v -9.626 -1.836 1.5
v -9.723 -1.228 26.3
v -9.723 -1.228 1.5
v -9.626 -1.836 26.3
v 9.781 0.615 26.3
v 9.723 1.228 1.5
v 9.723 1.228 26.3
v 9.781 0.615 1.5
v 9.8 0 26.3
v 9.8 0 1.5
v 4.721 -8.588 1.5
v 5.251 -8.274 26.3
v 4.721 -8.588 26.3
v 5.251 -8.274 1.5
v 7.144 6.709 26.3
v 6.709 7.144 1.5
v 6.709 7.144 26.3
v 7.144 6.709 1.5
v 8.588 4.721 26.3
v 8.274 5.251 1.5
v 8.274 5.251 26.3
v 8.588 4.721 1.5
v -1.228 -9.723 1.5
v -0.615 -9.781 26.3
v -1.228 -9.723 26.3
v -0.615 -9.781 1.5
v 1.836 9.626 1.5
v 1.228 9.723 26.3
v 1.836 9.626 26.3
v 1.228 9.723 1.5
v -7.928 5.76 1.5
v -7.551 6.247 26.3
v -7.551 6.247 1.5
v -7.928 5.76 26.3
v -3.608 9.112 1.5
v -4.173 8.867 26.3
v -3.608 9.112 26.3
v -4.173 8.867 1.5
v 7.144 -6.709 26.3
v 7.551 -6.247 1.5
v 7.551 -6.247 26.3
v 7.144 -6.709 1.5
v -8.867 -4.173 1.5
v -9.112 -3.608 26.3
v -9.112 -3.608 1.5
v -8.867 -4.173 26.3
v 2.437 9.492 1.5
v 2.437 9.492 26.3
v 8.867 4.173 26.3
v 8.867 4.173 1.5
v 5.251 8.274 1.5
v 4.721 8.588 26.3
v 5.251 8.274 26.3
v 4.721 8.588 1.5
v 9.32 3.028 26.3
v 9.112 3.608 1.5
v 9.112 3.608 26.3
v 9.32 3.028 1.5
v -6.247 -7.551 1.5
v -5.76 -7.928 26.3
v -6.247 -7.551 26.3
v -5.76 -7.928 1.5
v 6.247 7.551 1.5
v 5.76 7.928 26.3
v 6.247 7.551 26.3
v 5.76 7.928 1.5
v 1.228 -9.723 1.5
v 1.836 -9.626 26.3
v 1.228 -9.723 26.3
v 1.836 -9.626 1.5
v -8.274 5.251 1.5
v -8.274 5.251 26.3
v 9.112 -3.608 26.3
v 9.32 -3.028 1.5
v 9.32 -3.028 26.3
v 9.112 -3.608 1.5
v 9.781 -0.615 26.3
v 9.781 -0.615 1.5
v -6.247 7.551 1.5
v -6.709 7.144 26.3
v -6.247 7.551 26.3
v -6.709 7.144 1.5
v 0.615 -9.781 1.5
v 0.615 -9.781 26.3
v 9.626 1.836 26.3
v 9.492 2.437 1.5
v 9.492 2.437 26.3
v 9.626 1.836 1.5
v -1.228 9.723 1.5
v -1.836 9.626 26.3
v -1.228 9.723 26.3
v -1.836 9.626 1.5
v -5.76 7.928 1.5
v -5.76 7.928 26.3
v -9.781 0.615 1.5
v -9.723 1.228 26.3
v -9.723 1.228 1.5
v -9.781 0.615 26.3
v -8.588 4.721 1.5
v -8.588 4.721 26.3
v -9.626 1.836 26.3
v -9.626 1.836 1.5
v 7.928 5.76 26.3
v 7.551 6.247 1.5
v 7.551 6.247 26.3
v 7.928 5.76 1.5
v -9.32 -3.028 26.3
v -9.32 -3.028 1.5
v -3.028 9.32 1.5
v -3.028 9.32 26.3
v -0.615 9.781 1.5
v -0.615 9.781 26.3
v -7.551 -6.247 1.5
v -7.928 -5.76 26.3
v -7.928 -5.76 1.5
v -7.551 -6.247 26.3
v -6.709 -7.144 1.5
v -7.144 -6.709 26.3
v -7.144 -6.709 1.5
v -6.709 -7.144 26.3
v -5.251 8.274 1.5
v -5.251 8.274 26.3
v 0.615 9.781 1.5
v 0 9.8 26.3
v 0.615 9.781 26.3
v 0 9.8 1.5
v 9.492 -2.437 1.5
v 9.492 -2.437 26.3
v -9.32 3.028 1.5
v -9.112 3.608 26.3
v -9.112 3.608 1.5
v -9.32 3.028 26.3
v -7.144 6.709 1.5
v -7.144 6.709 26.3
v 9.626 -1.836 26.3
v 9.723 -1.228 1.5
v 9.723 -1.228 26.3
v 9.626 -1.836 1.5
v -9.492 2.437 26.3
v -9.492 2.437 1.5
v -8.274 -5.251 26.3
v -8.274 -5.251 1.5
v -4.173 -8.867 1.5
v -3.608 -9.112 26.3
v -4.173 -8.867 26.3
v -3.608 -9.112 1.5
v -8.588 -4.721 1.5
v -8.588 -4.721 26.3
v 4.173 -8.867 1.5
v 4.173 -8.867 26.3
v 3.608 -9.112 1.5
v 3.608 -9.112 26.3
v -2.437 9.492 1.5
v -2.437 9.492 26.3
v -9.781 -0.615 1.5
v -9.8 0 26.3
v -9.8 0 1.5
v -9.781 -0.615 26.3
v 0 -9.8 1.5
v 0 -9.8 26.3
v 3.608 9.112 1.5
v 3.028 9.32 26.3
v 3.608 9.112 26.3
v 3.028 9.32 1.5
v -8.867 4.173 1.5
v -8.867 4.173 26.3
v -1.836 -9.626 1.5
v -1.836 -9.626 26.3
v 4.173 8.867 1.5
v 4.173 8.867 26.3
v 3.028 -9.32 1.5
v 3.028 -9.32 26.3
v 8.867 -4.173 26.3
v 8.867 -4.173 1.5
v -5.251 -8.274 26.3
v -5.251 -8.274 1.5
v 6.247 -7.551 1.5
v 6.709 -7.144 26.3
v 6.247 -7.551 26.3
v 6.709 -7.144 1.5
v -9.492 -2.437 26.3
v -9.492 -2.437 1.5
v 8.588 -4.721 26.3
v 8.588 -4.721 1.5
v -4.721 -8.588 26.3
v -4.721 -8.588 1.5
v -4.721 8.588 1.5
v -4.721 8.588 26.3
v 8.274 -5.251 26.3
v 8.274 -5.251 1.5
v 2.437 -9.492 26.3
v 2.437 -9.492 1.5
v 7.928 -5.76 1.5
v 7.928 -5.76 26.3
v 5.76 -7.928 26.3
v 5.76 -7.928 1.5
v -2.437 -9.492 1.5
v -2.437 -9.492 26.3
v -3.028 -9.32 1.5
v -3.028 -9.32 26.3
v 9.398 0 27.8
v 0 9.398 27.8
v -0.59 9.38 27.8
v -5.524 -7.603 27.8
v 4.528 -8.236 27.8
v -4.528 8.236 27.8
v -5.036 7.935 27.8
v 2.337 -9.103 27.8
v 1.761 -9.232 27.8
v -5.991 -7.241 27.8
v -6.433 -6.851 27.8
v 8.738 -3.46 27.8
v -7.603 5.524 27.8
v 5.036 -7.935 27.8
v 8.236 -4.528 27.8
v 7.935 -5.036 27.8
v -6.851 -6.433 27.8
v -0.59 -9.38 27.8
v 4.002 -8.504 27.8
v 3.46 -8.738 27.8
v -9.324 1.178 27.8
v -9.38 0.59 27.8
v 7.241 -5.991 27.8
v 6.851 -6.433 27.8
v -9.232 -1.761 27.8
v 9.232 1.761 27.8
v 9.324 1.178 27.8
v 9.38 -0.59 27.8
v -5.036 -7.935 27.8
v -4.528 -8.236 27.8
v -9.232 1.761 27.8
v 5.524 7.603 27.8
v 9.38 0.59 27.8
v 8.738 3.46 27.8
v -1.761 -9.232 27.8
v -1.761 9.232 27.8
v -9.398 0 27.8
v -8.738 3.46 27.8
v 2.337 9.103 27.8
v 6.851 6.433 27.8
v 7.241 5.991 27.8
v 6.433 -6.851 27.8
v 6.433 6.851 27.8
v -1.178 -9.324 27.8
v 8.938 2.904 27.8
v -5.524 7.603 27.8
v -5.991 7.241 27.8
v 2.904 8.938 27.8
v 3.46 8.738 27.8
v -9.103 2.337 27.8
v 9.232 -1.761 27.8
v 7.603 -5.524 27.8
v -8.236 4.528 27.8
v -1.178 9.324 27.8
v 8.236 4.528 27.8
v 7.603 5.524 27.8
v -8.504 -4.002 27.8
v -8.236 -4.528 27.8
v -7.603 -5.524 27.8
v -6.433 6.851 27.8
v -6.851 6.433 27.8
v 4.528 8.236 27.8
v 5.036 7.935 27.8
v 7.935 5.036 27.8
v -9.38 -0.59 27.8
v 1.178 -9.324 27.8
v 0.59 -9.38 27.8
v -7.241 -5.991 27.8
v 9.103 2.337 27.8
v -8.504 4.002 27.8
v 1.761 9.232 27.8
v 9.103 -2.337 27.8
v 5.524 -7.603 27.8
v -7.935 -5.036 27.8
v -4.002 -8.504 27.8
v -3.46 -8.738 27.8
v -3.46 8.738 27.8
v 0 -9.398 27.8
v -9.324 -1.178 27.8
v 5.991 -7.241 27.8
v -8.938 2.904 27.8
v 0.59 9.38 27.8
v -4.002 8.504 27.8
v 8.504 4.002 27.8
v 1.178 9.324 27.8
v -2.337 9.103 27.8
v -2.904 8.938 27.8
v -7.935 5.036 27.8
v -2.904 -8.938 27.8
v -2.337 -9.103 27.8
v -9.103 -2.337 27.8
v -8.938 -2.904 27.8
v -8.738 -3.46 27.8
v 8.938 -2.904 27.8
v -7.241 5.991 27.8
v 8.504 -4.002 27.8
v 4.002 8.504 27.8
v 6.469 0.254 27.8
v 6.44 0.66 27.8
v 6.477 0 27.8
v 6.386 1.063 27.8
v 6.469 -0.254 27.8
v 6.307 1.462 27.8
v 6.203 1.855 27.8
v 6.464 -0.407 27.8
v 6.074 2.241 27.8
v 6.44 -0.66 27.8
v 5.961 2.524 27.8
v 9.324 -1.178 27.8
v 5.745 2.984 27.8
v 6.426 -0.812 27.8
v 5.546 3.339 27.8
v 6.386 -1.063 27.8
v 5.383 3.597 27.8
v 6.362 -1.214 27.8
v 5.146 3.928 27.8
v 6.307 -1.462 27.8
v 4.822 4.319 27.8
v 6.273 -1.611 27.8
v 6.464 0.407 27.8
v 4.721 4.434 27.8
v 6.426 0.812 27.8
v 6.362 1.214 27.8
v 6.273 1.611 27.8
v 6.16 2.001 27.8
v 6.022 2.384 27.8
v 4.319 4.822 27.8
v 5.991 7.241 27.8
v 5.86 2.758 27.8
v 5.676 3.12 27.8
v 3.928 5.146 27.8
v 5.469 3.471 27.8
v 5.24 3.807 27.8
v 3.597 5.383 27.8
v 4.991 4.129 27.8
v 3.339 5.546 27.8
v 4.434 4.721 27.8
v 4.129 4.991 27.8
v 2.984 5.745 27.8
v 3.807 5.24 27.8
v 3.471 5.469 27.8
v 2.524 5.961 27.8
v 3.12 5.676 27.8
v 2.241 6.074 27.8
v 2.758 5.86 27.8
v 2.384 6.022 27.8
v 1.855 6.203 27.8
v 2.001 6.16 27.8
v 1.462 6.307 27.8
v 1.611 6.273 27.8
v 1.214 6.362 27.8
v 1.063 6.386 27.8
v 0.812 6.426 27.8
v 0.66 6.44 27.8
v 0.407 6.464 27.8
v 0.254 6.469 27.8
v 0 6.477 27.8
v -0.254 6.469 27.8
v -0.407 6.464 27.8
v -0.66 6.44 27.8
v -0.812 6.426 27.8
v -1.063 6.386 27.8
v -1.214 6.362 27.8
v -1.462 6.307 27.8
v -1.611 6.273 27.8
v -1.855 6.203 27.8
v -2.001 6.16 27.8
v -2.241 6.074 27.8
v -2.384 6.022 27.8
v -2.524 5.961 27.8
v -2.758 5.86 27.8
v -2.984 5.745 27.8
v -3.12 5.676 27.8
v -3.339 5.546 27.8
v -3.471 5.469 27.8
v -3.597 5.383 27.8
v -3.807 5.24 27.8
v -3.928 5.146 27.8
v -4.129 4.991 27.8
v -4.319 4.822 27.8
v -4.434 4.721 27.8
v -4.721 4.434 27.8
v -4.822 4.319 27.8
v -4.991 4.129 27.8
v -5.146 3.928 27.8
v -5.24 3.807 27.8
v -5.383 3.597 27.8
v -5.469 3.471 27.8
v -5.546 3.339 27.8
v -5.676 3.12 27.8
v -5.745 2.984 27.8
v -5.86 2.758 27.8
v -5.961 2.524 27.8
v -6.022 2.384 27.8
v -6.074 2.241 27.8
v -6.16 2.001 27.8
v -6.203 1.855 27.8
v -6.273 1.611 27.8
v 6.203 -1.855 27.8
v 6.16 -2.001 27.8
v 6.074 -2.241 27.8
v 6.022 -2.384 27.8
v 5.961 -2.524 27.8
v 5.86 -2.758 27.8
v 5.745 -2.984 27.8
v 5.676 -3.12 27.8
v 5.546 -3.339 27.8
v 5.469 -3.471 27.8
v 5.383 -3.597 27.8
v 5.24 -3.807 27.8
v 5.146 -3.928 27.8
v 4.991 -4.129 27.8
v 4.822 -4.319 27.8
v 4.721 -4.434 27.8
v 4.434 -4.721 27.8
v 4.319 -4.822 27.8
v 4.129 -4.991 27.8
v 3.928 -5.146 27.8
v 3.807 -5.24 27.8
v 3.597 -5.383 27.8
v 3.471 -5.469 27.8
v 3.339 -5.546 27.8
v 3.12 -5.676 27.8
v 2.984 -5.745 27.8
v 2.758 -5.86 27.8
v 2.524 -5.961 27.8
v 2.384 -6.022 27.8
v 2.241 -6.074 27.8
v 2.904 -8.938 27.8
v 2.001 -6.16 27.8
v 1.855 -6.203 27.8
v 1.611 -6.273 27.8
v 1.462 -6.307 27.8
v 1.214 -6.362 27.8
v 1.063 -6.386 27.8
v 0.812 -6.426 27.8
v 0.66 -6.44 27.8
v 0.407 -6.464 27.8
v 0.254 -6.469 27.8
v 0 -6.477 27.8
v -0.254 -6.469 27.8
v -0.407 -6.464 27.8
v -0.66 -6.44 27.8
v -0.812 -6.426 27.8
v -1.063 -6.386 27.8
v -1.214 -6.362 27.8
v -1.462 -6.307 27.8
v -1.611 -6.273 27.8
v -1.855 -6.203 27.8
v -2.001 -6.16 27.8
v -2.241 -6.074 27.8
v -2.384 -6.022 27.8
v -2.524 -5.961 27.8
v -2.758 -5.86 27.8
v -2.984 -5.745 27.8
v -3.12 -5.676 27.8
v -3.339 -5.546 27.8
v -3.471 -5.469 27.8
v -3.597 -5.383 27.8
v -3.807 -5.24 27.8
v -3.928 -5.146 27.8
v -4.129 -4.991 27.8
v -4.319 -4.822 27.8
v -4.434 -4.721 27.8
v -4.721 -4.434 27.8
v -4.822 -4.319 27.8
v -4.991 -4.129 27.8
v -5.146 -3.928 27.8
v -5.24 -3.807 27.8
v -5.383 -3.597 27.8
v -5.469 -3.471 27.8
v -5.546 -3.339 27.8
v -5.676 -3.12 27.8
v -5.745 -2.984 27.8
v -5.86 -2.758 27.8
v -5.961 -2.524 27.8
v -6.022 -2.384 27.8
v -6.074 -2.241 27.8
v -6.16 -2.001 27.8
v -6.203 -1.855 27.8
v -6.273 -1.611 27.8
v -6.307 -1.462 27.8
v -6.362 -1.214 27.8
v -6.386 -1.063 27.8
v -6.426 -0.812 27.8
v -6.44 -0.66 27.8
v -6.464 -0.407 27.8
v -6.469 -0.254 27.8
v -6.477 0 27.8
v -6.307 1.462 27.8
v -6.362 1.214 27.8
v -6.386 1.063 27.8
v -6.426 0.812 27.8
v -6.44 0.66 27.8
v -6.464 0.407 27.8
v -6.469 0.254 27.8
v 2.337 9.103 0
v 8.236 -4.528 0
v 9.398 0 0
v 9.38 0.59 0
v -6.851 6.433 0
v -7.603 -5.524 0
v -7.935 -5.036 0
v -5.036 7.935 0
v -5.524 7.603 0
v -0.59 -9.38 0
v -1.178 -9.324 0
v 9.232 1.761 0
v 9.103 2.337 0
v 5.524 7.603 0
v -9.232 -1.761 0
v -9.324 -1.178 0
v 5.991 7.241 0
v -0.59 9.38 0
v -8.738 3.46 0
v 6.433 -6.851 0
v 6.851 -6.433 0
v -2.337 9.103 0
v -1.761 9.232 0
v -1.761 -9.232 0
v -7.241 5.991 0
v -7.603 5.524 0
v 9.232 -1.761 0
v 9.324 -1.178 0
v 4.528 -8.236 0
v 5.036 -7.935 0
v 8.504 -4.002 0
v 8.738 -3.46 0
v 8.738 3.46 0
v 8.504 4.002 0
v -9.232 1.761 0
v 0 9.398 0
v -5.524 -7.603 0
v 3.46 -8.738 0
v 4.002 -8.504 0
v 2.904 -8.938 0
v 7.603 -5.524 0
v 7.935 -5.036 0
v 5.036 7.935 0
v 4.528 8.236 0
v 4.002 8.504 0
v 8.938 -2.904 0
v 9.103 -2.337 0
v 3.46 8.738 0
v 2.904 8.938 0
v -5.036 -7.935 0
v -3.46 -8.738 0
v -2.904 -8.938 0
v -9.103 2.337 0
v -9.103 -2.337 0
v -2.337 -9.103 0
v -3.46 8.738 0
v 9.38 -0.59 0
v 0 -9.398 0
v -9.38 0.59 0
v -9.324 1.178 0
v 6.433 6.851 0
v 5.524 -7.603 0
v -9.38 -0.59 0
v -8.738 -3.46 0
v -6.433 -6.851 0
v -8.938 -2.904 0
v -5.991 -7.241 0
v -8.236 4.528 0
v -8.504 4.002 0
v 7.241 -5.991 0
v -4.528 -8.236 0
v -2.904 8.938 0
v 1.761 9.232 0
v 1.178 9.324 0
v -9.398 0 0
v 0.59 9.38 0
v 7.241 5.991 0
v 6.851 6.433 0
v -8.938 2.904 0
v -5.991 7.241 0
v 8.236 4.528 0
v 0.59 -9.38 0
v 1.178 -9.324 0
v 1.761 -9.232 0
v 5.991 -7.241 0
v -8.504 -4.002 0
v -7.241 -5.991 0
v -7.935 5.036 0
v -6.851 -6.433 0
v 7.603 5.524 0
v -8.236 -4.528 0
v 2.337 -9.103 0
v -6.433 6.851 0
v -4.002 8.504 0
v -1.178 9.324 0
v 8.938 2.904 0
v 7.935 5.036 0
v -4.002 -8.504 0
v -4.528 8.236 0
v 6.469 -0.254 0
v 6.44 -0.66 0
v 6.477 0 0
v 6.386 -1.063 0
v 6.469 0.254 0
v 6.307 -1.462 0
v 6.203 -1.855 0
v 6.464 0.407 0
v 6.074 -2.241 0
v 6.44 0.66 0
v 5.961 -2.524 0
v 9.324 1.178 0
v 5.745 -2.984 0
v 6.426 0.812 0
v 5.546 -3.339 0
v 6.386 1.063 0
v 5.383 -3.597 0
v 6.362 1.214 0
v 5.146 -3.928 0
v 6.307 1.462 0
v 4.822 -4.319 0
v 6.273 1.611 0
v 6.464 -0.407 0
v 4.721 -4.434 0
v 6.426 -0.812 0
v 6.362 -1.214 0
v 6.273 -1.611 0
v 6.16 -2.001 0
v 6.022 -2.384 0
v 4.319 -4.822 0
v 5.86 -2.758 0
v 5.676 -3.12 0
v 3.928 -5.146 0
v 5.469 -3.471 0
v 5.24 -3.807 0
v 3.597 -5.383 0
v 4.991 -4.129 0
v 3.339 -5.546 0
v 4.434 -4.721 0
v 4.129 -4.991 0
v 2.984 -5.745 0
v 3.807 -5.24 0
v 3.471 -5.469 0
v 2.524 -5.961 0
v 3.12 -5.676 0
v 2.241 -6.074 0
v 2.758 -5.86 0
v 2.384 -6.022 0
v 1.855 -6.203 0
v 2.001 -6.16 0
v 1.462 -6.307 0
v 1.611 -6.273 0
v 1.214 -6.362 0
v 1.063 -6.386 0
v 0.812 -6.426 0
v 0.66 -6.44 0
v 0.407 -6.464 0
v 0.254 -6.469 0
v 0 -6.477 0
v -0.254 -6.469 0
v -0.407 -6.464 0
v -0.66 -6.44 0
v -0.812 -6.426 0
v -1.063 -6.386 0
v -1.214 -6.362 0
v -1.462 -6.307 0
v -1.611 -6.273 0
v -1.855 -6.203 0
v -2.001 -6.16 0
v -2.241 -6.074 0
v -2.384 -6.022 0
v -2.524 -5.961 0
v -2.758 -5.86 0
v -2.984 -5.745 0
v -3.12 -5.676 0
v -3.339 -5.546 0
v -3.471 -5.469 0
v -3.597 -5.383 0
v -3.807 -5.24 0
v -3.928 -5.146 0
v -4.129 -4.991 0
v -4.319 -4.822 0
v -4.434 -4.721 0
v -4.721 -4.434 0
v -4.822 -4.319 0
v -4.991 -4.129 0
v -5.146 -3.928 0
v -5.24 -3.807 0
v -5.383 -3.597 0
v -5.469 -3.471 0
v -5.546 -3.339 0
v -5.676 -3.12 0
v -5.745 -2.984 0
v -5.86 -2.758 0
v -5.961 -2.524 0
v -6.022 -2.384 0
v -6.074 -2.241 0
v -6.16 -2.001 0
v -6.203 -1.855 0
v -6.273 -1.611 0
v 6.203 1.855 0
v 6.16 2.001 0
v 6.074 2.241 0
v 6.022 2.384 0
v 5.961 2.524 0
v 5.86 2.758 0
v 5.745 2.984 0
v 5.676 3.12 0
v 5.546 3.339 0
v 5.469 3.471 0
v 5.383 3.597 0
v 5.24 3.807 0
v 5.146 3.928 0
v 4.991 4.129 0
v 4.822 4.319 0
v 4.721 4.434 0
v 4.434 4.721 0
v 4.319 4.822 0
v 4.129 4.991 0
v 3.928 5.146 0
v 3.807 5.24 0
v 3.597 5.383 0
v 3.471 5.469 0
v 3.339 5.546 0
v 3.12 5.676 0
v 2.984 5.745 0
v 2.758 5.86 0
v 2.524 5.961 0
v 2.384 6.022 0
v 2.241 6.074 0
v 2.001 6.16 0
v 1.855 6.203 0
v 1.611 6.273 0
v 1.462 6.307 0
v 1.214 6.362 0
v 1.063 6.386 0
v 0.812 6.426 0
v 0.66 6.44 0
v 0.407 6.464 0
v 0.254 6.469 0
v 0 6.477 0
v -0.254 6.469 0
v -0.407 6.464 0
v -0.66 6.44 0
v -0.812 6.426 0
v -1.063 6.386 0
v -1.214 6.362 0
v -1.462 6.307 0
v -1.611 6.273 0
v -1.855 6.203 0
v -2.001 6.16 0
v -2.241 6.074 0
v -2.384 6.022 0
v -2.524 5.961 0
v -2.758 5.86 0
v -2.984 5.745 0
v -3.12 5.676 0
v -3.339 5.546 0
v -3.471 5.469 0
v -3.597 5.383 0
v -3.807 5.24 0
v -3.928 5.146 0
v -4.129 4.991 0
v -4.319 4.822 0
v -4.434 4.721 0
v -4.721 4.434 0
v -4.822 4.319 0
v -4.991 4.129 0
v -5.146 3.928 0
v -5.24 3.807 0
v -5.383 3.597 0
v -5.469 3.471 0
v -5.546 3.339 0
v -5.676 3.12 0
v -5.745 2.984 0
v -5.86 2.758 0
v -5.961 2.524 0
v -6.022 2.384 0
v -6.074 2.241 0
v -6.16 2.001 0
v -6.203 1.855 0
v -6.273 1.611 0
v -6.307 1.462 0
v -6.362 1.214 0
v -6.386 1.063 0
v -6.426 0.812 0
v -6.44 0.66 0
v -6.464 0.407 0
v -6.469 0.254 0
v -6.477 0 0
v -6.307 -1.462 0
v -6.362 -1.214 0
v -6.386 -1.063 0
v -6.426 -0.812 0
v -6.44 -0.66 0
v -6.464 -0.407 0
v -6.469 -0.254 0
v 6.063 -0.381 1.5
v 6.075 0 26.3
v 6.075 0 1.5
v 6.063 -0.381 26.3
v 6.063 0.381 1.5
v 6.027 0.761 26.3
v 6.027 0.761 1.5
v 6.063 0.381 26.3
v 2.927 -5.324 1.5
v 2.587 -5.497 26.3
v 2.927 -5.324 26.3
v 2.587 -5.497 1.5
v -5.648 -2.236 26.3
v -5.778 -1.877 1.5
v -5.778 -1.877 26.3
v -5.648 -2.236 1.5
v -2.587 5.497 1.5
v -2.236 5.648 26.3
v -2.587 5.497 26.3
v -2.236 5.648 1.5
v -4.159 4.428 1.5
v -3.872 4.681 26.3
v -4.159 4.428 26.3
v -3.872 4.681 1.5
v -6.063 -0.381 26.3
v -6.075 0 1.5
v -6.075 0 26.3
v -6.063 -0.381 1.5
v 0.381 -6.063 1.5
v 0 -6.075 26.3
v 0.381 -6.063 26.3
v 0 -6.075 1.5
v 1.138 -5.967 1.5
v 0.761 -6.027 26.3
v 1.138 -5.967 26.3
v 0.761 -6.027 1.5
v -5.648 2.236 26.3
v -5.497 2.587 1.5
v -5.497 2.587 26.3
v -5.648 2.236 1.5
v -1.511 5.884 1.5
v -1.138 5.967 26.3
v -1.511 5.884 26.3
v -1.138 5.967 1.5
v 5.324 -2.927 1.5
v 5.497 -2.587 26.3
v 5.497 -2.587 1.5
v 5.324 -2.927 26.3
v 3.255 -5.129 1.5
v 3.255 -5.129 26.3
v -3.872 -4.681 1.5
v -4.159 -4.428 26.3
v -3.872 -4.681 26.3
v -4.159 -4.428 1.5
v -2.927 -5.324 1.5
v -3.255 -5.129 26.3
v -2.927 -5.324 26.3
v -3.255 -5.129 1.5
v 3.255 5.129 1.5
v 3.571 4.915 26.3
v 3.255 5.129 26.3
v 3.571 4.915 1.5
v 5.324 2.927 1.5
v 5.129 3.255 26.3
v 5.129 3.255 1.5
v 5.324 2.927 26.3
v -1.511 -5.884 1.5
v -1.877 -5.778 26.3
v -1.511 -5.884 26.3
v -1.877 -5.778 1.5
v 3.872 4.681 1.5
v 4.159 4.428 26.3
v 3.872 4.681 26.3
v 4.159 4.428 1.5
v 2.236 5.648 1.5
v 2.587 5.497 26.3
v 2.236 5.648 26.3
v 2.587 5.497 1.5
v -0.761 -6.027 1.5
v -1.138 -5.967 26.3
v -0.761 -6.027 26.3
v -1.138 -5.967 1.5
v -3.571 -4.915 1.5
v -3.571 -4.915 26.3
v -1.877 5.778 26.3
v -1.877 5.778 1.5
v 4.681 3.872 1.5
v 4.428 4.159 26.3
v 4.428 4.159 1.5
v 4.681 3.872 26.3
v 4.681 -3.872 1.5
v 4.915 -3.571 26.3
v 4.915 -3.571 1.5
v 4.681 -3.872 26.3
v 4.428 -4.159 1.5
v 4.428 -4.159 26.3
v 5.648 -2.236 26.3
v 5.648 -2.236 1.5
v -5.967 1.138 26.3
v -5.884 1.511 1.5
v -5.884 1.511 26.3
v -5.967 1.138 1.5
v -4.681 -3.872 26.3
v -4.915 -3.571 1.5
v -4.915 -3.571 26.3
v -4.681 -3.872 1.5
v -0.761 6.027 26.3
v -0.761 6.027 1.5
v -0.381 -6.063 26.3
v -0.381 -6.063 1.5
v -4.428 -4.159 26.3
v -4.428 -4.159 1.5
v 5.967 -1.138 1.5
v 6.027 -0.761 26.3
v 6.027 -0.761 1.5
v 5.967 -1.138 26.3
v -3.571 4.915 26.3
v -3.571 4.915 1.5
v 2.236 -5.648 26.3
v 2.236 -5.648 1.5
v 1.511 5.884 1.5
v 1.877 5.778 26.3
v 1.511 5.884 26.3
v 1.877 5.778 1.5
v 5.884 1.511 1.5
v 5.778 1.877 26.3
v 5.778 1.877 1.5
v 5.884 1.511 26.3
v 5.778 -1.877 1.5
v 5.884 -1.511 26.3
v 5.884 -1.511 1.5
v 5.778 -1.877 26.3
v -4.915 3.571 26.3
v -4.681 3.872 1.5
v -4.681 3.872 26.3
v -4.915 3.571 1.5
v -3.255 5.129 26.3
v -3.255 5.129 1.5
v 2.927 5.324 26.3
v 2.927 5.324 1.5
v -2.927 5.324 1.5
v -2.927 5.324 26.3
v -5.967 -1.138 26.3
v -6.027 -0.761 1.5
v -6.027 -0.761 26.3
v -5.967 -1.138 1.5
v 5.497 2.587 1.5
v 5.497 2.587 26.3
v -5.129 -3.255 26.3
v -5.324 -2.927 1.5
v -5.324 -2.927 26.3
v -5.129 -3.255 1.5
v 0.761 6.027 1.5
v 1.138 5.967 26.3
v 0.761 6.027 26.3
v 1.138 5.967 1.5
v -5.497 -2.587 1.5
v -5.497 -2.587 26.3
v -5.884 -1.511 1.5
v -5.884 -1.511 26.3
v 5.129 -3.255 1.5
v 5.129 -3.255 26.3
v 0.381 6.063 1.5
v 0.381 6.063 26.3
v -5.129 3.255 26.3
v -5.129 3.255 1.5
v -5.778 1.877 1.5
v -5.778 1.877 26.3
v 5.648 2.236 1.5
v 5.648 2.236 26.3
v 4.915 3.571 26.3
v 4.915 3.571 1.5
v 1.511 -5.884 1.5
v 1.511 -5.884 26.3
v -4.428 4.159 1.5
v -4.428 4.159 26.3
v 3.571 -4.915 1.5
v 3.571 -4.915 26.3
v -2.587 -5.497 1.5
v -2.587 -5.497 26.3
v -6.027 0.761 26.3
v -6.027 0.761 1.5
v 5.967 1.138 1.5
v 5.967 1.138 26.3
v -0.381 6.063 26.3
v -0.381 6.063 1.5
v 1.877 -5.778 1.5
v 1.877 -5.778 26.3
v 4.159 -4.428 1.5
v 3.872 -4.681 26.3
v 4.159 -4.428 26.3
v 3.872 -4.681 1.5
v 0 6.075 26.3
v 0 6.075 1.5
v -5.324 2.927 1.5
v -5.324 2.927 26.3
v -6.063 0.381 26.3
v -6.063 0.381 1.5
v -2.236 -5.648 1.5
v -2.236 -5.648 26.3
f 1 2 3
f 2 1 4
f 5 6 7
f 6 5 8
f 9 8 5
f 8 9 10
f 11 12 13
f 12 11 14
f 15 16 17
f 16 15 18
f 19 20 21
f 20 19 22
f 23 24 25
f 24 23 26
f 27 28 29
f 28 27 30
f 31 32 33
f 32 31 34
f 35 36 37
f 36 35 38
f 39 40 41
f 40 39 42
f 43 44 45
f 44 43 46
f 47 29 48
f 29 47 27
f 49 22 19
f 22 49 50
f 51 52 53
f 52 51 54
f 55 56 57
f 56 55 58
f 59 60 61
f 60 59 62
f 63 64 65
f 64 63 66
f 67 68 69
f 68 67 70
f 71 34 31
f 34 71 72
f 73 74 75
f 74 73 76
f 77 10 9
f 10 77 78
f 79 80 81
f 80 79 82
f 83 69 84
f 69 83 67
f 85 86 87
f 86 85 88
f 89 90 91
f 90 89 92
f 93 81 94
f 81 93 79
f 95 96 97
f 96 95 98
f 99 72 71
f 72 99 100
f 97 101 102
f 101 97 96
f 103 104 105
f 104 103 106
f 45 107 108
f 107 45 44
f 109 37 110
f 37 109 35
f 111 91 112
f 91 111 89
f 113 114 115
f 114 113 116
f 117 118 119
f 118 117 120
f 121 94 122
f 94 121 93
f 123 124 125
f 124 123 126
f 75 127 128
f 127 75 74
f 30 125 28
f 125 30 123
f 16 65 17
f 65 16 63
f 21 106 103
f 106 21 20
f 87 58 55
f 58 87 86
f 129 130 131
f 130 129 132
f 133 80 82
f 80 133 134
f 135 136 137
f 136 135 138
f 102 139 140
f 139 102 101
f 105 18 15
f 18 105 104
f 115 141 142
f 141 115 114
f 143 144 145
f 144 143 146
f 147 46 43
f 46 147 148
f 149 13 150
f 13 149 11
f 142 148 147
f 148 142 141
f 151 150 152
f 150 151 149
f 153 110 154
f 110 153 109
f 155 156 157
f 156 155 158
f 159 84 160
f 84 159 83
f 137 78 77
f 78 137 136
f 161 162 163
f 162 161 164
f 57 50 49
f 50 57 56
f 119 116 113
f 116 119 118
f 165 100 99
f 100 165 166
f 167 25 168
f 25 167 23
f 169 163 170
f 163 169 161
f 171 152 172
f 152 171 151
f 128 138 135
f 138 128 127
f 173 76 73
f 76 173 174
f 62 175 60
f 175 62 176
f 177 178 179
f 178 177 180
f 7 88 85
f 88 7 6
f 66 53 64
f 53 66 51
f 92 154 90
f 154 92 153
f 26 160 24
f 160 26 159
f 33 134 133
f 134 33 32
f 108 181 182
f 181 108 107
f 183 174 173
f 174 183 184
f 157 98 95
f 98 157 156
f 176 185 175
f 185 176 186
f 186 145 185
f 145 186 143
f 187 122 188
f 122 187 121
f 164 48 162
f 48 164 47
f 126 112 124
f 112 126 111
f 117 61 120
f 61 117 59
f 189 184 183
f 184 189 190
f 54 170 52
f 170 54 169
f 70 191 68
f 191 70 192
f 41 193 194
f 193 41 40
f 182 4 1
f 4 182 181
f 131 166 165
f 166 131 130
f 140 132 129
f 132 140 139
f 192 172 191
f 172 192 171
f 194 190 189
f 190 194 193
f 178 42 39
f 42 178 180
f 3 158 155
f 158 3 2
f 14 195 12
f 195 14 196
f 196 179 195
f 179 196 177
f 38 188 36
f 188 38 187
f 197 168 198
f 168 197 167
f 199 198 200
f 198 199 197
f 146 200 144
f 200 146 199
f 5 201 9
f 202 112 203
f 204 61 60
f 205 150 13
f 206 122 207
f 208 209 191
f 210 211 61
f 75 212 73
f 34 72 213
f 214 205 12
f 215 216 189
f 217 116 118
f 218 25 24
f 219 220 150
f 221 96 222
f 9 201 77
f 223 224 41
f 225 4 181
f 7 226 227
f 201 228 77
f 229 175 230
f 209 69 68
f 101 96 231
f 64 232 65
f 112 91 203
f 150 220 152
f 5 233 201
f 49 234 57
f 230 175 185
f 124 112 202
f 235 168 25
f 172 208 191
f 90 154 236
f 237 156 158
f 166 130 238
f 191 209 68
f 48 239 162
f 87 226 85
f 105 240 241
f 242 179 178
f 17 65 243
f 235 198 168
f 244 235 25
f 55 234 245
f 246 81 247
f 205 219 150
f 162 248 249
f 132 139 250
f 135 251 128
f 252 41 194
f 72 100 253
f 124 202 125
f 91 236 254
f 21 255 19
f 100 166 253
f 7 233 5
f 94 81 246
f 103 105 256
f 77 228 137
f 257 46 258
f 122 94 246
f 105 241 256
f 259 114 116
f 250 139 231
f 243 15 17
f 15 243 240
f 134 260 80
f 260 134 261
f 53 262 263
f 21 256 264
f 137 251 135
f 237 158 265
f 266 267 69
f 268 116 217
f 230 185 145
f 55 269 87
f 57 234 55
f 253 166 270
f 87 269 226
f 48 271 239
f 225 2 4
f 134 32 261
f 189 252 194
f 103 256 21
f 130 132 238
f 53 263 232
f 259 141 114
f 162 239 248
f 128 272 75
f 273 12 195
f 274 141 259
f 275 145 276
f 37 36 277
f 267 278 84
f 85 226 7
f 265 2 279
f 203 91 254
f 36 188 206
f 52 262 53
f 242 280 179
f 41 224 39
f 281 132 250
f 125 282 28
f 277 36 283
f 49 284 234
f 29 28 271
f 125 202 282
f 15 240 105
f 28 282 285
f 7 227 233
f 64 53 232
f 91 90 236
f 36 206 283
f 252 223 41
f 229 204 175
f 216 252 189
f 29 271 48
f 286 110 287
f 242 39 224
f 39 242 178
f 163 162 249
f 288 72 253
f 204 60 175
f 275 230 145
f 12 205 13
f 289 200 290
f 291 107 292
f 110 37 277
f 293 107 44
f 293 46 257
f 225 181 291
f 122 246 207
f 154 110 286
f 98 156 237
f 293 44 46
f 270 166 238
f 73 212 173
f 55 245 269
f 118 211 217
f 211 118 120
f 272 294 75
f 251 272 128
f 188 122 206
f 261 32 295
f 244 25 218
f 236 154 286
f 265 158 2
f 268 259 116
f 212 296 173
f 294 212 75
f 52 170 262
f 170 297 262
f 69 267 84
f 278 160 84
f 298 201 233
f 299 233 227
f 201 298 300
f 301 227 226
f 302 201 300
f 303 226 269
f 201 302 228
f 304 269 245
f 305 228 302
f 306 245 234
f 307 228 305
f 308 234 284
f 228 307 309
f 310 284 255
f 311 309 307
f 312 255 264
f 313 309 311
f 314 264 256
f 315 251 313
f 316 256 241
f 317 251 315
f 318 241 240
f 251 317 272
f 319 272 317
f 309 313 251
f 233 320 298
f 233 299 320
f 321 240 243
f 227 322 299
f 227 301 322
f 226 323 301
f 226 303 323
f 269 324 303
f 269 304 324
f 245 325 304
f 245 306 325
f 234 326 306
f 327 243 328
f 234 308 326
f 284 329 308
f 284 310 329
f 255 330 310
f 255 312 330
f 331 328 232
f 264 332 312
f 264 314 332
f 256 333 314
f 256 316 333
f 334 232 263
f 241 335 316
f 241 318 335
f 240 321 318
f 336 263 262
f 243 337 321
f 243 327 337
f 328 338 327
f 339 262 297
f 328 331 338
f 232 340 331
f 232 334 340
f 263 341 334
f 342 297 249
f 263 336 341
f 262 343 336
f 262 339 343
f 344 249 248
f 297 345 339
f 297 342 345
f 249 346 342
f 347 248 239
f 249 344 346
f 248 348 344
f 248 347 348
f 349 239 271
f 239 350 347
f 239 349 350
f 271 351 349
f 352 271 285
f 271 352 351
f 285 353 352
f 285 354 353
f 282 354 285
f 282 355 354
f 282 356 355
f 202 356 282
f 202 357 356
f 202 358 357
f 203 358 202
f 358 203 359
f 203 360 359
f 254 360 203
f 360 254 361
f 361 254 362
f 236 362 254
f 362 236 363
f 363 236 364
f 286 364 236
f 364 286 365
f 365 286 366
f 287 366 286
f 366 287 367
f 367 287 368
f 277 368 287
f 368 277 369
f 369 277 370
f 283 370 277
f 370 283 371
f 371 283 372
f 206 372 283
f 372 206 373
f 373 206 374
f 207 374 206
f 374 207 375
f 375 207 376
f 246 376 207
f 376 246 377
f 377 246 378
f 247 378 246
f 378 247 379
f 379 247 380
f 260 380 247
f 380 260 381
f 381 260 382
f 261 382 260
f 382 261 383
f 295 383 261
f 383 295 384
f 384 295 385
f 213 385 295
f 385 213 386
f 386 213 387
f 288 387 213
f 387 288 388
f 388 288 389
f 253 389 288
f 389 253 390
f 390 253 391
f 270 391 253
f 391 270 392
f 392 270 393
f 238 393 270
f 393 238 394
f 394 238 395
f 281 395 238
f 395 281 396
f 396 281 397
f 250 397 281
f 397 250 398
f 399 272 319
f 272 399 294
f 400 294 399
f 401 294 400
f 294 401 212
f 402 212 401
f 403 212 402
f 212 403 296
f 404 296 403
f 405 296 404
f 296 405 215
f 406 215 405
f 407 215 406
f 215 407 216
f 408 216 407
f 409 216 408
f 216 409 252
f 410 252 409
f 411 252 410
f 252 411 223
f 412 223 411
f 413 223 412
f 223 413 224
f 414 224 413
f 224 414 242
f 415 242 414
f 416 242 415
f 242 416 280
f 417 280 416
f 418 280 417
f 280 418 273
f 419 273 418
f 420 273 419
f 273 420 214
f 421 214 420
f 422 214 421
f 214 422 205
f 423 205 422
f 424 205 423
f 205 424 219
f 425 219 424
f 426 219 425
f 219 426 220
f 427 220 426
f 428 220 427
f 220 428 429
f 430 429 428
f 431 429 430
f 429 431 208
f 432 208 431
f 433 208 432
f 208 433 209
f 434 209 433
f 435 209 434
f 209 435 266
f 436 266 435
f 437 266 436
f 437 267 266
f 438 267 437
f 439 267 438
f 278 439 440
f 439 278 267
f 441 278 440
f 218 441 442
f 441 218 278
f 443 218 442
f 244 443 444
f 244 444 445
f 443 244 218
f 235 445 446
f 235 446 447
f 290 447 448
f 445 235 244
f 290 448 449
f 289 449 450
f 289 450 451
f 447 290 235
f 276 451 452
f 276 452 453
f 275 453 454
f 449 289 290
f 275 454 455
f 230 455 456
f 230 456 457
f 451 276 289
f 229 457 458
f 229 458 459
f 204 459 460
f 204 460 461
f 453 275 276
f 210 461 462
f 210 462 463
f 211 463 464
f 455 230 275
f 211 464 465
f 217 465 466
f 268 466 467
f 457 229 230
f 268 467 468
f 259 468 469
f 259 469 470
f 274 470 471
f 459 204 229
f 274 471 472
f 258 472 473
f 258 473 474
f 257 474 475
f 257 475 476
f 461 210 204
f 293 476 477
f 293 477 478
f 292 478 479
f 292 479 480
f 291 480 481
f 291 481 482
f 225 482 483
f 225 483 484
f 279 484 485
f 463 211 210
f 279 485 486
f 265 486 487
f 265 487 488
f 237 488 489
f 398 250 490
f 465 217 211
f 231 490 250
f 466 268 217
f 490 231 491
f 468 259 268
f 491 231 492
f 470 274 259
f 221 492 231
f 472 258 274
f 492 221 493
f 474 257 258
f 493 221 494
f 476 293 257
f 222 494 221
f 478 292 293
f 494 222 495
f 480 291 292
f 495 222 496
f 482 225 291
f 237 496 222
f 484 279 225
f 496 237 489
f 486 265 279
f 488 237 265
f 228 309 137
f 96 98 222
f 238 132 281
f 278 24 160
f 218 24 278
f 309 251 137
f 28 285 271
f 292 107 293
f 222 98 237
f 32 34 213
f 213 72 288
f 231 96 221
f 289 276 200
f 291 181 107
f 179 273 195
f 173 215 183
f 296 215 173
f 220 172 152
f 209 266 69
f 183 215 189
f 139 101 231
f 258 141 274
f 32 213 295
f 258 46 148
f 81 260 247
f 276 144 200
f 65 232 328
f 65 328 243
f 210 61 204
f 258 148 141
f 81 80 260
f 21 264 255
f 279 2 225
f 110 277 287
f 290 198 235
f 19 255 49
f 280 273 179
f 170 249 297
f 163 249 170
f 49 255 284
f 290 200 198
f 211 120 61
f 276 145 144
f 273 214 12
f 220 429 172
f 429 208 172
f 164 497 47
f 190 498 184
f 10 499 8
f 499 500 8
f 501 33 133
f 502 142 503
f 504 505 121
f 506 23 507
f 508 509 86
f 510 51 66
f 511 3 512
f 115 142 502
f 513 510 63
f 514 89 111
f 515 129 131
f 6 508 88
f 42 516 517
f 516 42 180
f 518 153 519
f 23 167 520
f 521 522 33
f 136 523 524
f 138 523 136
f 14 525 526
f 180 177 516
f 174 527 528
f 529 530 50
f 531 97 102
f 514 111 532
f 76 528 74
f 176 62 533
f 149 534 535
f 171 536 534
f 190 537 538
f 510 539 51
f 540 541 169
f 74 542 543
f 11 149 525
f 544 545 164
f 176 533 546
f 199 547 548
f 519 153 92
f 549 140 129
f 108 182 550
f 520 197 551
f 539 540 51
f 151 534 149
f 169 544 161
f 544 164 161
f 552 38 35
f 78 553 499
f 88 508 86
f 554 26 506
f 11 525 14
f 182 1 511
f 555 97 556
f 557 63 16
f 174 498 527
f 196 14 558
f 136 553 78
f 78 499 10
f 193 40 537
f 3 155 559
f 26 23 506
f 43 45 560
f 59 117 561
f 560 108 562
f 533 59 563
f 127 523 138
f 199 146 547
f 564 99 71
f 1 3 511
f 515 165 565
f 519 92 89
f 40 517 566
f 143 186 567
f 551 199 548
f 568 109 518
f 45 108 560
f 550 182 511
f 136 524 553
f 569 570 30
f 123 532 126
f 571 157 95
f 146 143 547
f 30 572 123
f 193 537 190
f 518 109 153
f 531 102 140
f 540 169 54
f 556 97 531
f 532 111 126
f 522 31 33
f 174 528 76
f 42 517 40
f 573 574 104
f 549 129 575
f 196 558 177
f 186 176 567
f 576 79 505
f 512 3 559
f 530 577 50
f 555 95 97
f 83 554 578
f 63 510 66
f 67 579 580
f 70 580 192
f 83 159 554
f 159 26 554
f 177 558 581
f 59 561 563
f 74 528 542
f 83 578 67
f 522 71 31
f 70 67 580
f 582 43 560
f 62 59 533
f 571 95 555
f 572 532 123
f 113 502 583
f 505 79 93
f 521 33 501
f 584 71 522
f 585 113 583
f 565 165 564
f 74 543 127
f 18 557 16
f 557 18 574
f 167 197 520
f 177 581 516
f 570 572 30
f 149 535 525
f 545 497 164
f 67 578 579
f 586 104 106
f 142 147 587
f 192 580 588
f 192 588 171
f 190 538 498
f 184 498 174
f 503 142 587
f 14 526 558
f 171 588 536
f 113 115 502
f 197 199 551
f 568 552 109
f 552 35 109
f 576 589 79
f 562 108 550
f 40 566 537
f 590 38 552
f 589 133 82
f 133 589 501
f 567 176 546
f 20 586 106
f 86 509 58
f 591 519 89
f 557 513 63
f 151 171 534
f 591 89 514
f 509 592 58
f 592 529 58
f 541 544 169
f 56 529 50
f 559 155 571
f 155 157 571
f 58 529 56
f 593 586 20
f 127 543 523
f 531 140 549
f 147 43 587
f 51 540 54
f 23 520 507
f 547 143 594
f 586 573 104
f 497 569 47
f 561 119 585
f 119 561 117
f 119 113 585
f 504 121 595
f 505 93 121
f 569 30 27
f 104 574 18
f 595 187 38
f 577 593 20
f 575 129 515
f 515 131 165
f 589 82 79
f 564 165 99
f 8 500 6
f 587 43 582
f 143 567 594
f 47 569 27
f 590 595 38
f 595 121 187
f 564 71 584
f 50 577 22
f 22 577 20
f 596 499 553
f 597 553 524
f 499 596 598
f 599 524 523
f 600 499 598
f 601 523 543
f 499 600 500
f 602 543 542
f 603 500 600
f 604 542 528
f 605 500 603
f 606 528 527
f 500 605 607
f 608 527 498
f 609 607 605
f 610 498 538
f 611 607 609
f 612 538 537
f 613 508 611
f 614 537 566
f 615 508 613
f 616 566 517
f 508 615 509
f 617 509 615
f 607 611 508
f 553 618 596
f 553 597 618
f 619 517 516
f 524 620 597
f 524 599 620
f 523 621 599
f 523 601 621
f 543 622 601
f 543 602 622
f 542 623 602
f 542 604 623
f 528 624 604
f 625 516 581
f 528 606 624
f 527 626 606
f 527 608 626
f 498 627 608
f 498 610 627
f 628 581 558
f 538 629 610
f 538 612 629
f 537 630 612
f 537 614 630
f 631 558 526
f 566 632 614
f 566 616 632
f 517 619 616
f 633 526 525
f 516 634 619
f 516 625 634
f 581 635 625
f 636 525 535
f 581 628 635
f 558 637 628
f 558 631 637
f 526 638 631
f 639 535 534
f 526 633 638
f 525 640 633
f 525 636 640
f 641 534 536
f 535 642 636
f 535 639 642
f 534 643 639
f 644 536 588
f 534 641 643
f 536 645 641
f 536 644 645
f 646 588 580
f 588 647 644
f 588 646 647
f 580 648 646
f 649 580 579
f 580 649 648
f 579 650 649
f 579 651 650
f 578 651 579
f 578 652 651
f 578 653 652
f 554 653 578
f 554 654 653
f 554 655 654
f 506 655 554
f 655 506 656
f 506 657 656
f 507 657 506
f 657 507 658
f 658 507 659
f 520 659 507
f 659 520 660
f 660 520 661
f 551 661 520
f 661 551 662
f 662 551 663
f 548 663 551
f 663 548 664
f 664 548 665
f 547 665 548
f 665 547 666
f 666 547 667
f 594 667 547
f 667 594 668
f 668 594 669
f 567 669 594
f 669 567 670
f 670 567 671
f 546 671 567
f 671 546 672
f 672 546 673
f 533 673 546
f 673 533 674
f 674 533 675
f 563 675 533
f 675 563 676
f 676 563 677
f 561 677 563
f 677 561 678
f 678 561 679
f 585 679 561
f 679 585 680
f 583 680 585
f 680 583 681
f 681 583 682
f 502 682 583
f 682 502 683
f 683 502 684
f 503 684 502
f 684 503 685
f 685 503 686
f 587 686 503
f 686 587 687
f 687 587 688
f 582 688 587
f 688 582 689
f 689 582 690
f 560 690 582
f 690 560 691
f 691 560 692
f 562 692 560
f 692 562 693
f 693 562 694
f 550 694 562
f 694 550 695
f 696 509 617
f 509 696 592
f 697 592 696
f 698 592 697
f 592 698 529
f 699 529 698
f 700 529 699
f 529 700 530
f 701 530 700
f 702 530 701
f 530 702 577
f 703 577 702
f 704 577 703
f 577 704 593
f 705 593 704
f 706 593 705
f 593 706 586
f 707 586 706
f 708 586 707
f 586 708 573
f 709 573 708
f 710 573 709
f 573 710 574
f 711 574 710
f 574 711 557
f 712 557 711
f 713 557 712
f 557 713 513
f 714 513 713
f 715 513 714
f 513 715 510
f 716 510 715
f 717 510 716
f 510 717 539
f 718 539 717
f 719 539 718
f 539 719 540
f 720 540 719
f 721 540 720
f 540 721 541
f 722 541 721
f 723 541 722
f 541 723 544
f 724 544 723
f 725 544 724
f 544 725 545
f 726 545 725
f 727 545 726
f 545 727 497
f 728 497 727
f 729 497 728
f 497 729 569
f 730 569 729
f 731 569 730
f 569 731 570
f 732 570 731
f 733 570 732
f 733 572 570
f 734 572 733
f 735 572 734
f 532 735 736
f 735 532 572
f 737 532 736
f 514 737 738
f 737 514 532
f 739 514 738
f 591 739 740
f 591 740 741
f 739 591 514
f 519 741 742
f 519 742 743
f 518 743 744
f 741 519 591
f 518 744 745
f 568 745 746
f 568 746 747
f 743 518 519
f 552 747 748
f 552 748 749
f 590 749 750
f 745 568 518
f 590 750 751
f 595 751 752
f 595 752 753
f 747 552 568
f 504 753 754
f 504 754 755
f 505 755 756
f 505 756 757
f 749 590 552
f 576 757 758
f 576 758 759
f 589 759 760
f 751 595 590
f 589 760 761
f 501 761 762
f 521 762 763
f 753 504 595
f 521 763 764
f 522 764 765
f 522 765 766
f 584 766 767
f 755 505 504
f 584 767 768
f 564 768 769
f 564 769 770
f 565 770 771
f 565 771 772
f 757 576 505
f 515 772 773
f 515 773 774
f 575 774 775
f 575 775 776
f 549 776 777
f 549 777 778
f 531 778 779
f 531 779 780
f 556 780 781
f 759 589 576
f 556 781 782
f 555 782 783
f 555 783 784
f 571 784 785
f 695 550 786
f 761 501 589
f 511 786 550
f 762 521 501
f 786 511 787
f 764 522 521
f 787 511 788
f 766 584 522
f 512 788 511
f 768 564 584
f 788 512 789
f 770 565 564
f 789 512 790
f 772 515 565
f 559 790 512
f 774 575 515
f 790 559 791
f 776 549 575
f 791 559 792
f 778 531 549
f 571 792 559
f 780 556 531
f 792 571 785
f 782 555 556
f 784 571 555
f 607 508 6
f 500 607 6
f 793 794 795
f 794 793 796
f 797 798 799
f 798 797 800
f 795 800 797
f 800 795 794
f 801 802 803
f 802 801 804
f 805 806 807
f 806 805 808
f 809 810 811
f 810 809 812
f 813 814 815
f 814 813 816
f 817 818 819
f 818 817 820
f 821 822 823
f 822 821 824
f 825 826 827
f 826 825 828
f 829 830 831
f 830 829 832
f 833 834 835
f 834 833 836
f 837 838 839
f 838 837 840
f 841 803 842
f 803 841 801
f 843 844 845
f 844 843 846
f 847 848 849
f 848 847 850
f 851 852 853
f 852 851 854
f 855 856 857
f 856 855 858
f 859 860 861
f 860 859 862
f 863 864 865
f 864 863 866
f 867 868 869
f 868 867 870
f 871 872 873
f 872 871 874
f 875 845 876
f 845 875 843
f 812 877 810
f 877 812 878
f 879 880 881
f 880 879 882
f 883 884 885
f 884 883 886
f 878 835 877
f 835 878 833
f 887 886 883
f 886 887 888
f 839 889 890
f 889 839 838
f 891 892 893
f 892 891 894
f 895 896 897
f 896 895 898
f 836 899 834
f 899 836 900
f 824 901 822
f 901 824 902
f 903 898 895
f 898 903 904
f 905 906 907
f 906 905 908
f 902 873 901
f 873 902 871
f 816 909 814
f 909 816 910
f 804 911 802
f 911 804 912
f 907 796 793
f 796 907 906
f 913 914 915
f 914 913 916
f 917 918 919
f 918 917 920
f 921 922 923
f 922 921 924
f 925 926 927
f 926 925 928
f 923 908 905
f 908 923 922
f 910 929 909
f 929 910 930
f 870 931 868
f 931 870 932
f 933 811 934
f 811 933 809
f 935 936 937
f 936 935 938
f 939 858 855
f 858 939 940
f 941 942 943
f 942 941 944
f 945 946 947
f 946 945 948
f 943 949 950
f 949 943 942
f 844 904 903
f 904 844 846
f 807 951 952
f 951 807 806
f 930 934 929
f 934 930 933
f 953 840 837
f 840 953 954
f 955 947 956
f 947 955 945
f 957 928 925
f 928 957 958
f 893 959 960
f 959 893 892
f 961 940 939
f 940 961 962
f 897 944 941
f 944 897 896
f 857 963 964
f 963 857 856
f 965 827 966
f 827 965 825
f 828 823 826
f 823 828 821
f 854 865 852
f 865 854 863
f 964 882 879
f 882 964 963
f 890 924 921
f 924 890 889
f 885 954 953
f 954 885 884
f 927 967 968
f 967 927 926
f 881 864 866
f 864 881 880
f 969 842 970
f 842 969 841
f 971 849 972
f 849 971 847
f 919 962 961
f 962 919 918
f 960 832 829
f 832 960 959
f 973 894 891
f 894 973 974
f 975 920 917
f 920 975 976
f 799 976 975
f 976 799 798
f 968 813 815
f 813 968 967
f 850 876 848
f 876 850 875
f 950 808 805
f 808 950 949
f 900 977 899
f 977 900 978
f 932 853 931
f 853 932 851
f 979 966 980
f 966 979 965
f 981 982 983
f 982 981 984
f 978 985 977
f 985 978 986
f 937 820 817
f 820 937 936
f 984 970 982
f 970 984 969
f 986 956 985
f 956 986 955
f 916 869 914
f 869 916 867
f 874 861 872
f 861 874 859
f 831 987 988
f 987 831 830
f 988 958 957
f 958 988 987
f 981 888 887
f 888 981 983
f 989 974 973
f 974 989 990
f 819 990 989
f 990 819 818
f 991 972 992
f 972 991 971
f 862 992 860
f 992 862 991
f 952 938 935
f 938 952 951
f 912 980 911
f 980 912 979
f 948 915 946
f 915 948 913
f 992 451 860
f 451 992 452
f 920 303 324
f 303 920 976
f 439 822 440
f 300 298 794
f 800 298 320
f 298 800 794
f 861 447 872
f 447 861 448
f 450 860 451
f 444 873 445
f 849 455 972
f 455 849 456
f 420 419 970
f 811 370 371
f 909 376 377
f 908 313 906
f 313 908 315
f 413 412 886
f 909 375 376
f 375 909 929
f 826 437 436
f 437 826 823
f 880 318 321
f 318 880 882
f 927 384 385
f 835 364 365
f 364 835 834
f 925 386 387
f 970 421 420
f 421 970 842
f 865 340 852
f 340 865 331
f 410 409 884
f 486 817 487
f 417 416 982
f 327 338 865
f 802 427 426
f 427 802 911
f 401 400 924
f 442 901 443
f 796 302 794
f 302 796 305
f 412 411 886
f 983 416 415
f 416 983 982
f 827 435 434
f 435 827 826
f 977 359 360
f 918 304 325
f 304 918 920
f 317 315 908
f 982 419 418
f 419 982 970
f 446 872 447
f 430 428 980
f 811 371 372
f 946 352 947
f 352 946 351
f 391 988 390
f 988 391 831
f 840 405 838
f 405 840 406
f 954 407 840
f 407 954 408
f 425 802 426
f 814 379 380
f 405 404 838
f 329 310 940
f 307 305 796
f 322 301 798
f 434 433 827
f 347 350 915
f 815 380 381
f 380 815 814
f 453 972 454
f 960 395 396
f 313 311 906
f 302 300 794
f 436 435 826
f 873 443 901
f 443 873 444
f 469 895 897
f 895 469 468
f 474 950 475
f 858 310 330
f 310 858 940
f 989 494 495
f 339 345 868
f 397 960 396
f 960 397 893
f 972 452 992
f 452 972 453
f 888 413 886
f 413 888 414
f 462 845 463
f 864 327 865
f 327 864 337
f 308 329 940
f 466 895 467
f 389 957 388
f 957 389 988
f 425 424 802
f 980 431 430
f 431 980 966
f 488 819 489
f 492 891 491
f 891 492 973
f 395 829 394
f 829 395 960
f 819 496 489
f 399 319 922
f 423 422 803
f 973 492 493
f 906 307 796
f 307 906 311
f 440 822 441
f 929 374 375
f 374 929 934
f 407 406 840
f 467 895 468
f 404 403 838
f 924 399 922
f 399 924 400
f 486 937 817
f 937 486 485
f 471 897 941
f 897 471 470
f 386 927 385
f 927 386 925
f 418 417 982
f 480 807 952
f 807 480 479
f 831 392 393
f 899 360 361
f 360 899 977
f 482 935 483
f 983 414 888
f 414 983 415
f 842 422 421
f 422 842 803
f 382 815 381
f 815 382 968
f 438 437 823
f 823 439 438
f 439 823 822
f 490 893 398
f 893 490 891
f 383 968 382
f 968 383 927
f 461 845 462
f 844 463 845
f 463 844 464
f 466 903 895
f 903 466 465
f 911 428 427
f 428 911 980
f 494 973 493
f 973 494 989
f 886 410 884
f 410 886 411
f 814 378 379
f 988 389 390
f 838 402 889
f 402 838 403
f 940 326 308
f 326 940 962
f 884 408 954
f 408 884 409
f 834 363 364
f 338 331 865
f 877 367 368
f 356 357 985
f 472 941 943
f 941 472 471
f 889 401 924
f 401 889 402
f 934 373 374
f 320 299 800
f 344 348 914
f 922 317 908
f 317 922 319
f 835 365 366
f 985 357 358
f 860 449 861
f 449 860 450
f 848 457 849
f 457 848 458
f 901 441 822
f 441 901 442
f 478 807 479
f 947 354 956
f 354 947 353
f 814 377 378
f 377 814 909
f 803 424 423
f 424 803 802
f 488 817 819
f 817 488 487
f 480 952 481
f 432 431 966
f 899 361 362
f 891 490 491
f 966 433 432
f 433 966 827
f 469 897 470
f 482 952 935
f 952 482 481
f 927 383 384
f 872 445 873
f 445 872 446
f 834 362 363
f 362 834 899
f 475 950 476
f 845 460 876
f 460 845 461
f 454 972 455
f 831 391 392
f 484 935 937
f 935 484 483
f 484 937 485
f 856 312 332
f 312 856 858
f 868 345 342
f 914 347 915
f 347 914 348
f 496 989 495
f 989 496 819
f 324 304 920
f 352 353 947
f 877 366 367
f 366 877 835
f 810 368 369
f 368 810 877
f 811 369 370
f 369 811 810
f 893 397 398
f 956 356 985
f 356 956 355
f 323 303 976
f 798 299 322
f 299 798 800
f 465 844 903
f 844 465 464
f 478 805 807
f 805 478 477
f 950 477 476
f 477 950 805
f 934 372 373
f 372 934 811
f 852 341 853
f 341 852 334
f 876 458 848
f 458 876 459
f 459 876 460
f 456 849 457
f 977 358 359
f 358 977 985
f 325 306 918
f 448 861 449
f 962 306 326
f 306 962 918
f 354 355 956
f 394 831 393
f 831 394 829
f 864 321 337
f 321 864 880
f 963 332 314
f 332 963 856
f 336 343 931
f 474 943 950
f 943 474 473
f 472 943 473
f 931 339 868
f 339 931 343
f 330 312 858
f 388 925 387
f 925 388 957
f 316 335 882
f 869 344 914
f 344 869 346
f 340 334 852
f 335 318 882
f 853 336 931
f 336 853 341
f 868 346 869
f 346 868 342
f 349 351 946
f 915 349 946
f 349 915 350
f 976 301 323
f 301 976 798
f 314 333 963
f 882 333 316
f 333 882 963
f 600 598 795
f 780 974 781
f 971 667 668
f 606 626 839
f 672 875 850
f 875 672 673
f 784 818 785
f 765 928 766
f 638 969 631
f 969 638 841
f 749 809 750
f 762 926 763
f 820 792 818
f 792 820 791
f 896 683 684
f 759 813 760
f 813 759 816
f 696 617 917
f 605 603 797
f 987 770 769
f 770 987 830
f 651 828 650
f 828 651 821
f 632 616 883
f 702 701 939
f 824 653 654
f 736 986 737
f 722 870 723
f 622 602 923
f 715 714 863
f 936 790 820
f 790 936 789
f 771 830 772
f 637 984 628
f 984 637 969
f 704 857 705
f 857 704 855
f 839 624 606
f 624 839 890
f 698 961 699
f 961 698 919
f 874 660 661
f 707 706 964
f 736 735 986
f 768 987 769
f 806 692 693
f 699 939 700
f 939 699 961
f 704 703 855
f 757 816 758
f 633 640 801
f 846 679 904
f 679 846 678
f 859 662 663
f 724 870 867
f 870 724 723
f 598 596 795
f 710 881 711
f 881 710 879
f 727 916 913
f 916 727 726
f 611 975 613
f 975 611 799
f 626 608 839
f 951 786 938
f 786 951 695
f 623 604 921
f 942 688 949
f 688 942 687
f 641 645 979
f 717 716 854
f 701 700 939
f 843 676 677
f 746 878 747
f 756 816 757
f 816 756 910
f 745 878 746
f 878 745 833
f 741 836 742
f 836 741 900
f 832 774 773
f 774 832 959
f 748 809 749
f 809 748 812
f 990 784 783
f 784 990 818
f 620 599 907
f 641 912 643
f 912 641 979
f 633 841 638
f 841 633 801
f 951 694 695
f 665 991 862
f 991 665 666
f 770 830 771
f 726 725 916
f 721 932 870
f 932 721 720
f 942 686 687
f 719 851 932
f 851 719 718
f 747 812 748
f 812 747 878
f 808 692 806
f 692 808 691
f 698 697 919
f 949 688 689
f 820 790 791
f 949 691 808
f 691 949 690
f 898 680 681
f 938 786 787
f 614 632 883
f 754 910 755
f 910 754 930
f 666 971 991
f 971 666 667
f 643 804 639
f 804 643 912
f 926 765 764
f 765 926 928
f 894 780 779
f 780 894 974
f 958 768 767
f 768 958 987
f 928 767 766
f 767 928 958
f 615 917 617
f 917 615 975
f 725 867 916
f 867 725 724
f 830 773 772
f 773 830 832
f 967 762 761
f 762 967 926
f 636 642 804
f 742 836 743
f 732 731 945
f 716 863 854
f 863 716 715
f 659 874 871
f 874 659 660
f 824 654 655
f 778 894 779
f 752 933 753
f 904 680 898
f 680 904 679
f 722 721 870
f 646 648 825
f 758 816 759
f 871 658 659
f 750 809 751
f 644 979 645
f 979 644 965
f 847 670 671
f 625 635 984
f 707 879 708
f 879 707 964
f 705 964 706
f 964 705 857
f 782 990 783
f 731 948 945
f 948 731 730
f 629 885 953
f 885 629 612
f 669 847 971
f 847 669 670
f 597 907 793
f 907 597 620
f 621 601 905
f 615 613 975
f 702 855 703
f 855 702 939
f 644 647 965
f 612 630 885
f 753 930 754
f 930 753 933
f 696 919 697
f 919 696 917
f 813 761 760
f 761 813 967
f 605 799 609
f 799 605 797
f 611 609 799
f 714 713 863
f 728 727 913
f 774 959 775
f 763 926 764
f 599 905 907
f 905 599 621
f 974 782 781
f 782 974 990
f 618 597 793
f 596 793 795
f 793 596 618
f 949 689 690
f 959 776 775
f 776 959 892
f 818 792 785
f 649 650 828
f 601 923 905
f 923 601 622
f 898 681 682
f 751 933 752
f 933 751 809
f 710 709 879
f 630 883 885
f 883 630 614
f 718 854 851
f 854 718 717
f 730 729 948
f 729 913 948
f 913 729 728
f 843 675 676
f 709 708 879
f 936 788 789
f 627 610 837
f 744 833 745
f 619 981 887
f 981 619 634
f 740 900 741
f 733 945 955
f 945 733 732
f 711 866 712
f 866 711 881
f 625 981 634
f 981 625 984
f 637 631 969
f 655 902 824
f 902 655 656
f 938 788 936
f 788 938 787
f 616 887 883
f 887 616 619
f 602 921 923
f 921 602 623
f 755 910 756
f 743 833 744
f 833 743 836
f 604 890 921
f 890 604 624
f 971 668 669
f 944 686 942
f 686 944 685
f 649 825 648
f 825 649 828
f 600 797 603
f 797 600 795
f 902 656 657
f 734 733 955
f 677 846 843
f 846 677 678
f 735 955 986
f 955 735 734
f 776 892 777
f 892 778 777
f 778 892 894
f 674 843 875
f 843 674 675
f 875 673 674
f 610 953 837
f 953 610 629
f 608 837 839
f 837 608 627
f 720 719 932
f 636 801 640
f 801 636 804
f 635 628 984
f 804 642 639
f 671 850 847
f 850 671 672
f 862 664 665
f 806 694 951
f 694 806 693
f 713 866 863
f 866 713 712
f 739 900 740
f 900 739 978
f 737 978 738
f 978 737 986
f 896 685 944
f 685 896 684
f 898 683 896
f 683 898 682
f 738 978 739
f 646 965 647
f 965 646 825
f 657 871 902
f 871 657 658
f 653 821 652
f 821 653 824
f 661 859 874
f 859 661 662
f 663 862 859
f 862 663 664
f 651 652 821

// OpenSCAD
// Copyright 2017 Pavel Penev
// https://www.thingiverse.com/pavpen/about
//
// You can use this file under Attribution-ShareAlike 4.0 International
// (CC BY-SA 4.0).
//
// If you need to use it under another license, send me a message.

// Parameters for J260 Igus linear bearings
// <http://www.igus.com/wpck/3660/drylin_r_rj260um_02>:
outer_r = 19.2 / 2 + 0.2;
inner_r = 12.15 / 2;

// Length of the part actually intended to contact the axle:
sleeve_length = 25 - 0.2;
chamfer_length = 1.5;

// Total length of the bearing:
length = sleeve_length + 2 * chamfer_length;

outer_chamfer_angle = 15;
inner_chamfer_angle = 15;

fn = 100;


// Export functions:
function pro_pavpen_rj260_linear_bearing_outer_r() = outer_r;
function pro_pavpen_rj260_linear_bearing_inner_r() = inner_r;
function pro_pavpen_rj260_linear_bearing_sleeve_length() = sleeve_length;
function pro_pavpen_rj260_linear_bearing_length() = length;

// Demo:
pro_pavpen_rj260_linear_bearing();


module pro_pavpen_rj260_linear_bearing()
{
    difference()
    {
        union()
        {
            translate([0, 0, chamfer_length])
            cylinder(r = outer_r, h = sleeve_length, $fn = fn);
            
            // Top outer chamfer:
            translate([0, 0, chamfer_length + sleeve_length])
            cylinder(
                r1 = outer_r,
                r2 = outer_r - chamfer_length * tan(outer_chamfer_angle),
                h = chamfer_length,
                $fn = fn);
            
            // Bottom outer chamfer:
            cylinder(
                r1 = outer_r - chamfer_length * tan(outer_chamfer_angle),
                r2 = outer_r,
                h = chamfer_length,
                $fn = fn);
        }
        
        translate([0, 0, -1])
        cylinder(r = inner_r, h = length + 2, $fn = fn);
        
        // Top inner chamfer:
        translate([0, 0, chamfer_length + sleeve_length])
        cylinder(
            r1 = inner_r,
            r2 = inner_r + (chamfer_length + 1) * tan(inner_chamfer_angle),
            h = chamfer_length + 1,
            $fn = fn);
        
        // Bottom inner chamfer:
        translate([0, 0, -1])
        cylinder(
            r1 = inner_r + (chamfer_length + 1) * tan(inner_chamfer_angle),
            r2 = inner_r,
            h = chamfer_length + 1,
            $fn = fn);
    }
}
